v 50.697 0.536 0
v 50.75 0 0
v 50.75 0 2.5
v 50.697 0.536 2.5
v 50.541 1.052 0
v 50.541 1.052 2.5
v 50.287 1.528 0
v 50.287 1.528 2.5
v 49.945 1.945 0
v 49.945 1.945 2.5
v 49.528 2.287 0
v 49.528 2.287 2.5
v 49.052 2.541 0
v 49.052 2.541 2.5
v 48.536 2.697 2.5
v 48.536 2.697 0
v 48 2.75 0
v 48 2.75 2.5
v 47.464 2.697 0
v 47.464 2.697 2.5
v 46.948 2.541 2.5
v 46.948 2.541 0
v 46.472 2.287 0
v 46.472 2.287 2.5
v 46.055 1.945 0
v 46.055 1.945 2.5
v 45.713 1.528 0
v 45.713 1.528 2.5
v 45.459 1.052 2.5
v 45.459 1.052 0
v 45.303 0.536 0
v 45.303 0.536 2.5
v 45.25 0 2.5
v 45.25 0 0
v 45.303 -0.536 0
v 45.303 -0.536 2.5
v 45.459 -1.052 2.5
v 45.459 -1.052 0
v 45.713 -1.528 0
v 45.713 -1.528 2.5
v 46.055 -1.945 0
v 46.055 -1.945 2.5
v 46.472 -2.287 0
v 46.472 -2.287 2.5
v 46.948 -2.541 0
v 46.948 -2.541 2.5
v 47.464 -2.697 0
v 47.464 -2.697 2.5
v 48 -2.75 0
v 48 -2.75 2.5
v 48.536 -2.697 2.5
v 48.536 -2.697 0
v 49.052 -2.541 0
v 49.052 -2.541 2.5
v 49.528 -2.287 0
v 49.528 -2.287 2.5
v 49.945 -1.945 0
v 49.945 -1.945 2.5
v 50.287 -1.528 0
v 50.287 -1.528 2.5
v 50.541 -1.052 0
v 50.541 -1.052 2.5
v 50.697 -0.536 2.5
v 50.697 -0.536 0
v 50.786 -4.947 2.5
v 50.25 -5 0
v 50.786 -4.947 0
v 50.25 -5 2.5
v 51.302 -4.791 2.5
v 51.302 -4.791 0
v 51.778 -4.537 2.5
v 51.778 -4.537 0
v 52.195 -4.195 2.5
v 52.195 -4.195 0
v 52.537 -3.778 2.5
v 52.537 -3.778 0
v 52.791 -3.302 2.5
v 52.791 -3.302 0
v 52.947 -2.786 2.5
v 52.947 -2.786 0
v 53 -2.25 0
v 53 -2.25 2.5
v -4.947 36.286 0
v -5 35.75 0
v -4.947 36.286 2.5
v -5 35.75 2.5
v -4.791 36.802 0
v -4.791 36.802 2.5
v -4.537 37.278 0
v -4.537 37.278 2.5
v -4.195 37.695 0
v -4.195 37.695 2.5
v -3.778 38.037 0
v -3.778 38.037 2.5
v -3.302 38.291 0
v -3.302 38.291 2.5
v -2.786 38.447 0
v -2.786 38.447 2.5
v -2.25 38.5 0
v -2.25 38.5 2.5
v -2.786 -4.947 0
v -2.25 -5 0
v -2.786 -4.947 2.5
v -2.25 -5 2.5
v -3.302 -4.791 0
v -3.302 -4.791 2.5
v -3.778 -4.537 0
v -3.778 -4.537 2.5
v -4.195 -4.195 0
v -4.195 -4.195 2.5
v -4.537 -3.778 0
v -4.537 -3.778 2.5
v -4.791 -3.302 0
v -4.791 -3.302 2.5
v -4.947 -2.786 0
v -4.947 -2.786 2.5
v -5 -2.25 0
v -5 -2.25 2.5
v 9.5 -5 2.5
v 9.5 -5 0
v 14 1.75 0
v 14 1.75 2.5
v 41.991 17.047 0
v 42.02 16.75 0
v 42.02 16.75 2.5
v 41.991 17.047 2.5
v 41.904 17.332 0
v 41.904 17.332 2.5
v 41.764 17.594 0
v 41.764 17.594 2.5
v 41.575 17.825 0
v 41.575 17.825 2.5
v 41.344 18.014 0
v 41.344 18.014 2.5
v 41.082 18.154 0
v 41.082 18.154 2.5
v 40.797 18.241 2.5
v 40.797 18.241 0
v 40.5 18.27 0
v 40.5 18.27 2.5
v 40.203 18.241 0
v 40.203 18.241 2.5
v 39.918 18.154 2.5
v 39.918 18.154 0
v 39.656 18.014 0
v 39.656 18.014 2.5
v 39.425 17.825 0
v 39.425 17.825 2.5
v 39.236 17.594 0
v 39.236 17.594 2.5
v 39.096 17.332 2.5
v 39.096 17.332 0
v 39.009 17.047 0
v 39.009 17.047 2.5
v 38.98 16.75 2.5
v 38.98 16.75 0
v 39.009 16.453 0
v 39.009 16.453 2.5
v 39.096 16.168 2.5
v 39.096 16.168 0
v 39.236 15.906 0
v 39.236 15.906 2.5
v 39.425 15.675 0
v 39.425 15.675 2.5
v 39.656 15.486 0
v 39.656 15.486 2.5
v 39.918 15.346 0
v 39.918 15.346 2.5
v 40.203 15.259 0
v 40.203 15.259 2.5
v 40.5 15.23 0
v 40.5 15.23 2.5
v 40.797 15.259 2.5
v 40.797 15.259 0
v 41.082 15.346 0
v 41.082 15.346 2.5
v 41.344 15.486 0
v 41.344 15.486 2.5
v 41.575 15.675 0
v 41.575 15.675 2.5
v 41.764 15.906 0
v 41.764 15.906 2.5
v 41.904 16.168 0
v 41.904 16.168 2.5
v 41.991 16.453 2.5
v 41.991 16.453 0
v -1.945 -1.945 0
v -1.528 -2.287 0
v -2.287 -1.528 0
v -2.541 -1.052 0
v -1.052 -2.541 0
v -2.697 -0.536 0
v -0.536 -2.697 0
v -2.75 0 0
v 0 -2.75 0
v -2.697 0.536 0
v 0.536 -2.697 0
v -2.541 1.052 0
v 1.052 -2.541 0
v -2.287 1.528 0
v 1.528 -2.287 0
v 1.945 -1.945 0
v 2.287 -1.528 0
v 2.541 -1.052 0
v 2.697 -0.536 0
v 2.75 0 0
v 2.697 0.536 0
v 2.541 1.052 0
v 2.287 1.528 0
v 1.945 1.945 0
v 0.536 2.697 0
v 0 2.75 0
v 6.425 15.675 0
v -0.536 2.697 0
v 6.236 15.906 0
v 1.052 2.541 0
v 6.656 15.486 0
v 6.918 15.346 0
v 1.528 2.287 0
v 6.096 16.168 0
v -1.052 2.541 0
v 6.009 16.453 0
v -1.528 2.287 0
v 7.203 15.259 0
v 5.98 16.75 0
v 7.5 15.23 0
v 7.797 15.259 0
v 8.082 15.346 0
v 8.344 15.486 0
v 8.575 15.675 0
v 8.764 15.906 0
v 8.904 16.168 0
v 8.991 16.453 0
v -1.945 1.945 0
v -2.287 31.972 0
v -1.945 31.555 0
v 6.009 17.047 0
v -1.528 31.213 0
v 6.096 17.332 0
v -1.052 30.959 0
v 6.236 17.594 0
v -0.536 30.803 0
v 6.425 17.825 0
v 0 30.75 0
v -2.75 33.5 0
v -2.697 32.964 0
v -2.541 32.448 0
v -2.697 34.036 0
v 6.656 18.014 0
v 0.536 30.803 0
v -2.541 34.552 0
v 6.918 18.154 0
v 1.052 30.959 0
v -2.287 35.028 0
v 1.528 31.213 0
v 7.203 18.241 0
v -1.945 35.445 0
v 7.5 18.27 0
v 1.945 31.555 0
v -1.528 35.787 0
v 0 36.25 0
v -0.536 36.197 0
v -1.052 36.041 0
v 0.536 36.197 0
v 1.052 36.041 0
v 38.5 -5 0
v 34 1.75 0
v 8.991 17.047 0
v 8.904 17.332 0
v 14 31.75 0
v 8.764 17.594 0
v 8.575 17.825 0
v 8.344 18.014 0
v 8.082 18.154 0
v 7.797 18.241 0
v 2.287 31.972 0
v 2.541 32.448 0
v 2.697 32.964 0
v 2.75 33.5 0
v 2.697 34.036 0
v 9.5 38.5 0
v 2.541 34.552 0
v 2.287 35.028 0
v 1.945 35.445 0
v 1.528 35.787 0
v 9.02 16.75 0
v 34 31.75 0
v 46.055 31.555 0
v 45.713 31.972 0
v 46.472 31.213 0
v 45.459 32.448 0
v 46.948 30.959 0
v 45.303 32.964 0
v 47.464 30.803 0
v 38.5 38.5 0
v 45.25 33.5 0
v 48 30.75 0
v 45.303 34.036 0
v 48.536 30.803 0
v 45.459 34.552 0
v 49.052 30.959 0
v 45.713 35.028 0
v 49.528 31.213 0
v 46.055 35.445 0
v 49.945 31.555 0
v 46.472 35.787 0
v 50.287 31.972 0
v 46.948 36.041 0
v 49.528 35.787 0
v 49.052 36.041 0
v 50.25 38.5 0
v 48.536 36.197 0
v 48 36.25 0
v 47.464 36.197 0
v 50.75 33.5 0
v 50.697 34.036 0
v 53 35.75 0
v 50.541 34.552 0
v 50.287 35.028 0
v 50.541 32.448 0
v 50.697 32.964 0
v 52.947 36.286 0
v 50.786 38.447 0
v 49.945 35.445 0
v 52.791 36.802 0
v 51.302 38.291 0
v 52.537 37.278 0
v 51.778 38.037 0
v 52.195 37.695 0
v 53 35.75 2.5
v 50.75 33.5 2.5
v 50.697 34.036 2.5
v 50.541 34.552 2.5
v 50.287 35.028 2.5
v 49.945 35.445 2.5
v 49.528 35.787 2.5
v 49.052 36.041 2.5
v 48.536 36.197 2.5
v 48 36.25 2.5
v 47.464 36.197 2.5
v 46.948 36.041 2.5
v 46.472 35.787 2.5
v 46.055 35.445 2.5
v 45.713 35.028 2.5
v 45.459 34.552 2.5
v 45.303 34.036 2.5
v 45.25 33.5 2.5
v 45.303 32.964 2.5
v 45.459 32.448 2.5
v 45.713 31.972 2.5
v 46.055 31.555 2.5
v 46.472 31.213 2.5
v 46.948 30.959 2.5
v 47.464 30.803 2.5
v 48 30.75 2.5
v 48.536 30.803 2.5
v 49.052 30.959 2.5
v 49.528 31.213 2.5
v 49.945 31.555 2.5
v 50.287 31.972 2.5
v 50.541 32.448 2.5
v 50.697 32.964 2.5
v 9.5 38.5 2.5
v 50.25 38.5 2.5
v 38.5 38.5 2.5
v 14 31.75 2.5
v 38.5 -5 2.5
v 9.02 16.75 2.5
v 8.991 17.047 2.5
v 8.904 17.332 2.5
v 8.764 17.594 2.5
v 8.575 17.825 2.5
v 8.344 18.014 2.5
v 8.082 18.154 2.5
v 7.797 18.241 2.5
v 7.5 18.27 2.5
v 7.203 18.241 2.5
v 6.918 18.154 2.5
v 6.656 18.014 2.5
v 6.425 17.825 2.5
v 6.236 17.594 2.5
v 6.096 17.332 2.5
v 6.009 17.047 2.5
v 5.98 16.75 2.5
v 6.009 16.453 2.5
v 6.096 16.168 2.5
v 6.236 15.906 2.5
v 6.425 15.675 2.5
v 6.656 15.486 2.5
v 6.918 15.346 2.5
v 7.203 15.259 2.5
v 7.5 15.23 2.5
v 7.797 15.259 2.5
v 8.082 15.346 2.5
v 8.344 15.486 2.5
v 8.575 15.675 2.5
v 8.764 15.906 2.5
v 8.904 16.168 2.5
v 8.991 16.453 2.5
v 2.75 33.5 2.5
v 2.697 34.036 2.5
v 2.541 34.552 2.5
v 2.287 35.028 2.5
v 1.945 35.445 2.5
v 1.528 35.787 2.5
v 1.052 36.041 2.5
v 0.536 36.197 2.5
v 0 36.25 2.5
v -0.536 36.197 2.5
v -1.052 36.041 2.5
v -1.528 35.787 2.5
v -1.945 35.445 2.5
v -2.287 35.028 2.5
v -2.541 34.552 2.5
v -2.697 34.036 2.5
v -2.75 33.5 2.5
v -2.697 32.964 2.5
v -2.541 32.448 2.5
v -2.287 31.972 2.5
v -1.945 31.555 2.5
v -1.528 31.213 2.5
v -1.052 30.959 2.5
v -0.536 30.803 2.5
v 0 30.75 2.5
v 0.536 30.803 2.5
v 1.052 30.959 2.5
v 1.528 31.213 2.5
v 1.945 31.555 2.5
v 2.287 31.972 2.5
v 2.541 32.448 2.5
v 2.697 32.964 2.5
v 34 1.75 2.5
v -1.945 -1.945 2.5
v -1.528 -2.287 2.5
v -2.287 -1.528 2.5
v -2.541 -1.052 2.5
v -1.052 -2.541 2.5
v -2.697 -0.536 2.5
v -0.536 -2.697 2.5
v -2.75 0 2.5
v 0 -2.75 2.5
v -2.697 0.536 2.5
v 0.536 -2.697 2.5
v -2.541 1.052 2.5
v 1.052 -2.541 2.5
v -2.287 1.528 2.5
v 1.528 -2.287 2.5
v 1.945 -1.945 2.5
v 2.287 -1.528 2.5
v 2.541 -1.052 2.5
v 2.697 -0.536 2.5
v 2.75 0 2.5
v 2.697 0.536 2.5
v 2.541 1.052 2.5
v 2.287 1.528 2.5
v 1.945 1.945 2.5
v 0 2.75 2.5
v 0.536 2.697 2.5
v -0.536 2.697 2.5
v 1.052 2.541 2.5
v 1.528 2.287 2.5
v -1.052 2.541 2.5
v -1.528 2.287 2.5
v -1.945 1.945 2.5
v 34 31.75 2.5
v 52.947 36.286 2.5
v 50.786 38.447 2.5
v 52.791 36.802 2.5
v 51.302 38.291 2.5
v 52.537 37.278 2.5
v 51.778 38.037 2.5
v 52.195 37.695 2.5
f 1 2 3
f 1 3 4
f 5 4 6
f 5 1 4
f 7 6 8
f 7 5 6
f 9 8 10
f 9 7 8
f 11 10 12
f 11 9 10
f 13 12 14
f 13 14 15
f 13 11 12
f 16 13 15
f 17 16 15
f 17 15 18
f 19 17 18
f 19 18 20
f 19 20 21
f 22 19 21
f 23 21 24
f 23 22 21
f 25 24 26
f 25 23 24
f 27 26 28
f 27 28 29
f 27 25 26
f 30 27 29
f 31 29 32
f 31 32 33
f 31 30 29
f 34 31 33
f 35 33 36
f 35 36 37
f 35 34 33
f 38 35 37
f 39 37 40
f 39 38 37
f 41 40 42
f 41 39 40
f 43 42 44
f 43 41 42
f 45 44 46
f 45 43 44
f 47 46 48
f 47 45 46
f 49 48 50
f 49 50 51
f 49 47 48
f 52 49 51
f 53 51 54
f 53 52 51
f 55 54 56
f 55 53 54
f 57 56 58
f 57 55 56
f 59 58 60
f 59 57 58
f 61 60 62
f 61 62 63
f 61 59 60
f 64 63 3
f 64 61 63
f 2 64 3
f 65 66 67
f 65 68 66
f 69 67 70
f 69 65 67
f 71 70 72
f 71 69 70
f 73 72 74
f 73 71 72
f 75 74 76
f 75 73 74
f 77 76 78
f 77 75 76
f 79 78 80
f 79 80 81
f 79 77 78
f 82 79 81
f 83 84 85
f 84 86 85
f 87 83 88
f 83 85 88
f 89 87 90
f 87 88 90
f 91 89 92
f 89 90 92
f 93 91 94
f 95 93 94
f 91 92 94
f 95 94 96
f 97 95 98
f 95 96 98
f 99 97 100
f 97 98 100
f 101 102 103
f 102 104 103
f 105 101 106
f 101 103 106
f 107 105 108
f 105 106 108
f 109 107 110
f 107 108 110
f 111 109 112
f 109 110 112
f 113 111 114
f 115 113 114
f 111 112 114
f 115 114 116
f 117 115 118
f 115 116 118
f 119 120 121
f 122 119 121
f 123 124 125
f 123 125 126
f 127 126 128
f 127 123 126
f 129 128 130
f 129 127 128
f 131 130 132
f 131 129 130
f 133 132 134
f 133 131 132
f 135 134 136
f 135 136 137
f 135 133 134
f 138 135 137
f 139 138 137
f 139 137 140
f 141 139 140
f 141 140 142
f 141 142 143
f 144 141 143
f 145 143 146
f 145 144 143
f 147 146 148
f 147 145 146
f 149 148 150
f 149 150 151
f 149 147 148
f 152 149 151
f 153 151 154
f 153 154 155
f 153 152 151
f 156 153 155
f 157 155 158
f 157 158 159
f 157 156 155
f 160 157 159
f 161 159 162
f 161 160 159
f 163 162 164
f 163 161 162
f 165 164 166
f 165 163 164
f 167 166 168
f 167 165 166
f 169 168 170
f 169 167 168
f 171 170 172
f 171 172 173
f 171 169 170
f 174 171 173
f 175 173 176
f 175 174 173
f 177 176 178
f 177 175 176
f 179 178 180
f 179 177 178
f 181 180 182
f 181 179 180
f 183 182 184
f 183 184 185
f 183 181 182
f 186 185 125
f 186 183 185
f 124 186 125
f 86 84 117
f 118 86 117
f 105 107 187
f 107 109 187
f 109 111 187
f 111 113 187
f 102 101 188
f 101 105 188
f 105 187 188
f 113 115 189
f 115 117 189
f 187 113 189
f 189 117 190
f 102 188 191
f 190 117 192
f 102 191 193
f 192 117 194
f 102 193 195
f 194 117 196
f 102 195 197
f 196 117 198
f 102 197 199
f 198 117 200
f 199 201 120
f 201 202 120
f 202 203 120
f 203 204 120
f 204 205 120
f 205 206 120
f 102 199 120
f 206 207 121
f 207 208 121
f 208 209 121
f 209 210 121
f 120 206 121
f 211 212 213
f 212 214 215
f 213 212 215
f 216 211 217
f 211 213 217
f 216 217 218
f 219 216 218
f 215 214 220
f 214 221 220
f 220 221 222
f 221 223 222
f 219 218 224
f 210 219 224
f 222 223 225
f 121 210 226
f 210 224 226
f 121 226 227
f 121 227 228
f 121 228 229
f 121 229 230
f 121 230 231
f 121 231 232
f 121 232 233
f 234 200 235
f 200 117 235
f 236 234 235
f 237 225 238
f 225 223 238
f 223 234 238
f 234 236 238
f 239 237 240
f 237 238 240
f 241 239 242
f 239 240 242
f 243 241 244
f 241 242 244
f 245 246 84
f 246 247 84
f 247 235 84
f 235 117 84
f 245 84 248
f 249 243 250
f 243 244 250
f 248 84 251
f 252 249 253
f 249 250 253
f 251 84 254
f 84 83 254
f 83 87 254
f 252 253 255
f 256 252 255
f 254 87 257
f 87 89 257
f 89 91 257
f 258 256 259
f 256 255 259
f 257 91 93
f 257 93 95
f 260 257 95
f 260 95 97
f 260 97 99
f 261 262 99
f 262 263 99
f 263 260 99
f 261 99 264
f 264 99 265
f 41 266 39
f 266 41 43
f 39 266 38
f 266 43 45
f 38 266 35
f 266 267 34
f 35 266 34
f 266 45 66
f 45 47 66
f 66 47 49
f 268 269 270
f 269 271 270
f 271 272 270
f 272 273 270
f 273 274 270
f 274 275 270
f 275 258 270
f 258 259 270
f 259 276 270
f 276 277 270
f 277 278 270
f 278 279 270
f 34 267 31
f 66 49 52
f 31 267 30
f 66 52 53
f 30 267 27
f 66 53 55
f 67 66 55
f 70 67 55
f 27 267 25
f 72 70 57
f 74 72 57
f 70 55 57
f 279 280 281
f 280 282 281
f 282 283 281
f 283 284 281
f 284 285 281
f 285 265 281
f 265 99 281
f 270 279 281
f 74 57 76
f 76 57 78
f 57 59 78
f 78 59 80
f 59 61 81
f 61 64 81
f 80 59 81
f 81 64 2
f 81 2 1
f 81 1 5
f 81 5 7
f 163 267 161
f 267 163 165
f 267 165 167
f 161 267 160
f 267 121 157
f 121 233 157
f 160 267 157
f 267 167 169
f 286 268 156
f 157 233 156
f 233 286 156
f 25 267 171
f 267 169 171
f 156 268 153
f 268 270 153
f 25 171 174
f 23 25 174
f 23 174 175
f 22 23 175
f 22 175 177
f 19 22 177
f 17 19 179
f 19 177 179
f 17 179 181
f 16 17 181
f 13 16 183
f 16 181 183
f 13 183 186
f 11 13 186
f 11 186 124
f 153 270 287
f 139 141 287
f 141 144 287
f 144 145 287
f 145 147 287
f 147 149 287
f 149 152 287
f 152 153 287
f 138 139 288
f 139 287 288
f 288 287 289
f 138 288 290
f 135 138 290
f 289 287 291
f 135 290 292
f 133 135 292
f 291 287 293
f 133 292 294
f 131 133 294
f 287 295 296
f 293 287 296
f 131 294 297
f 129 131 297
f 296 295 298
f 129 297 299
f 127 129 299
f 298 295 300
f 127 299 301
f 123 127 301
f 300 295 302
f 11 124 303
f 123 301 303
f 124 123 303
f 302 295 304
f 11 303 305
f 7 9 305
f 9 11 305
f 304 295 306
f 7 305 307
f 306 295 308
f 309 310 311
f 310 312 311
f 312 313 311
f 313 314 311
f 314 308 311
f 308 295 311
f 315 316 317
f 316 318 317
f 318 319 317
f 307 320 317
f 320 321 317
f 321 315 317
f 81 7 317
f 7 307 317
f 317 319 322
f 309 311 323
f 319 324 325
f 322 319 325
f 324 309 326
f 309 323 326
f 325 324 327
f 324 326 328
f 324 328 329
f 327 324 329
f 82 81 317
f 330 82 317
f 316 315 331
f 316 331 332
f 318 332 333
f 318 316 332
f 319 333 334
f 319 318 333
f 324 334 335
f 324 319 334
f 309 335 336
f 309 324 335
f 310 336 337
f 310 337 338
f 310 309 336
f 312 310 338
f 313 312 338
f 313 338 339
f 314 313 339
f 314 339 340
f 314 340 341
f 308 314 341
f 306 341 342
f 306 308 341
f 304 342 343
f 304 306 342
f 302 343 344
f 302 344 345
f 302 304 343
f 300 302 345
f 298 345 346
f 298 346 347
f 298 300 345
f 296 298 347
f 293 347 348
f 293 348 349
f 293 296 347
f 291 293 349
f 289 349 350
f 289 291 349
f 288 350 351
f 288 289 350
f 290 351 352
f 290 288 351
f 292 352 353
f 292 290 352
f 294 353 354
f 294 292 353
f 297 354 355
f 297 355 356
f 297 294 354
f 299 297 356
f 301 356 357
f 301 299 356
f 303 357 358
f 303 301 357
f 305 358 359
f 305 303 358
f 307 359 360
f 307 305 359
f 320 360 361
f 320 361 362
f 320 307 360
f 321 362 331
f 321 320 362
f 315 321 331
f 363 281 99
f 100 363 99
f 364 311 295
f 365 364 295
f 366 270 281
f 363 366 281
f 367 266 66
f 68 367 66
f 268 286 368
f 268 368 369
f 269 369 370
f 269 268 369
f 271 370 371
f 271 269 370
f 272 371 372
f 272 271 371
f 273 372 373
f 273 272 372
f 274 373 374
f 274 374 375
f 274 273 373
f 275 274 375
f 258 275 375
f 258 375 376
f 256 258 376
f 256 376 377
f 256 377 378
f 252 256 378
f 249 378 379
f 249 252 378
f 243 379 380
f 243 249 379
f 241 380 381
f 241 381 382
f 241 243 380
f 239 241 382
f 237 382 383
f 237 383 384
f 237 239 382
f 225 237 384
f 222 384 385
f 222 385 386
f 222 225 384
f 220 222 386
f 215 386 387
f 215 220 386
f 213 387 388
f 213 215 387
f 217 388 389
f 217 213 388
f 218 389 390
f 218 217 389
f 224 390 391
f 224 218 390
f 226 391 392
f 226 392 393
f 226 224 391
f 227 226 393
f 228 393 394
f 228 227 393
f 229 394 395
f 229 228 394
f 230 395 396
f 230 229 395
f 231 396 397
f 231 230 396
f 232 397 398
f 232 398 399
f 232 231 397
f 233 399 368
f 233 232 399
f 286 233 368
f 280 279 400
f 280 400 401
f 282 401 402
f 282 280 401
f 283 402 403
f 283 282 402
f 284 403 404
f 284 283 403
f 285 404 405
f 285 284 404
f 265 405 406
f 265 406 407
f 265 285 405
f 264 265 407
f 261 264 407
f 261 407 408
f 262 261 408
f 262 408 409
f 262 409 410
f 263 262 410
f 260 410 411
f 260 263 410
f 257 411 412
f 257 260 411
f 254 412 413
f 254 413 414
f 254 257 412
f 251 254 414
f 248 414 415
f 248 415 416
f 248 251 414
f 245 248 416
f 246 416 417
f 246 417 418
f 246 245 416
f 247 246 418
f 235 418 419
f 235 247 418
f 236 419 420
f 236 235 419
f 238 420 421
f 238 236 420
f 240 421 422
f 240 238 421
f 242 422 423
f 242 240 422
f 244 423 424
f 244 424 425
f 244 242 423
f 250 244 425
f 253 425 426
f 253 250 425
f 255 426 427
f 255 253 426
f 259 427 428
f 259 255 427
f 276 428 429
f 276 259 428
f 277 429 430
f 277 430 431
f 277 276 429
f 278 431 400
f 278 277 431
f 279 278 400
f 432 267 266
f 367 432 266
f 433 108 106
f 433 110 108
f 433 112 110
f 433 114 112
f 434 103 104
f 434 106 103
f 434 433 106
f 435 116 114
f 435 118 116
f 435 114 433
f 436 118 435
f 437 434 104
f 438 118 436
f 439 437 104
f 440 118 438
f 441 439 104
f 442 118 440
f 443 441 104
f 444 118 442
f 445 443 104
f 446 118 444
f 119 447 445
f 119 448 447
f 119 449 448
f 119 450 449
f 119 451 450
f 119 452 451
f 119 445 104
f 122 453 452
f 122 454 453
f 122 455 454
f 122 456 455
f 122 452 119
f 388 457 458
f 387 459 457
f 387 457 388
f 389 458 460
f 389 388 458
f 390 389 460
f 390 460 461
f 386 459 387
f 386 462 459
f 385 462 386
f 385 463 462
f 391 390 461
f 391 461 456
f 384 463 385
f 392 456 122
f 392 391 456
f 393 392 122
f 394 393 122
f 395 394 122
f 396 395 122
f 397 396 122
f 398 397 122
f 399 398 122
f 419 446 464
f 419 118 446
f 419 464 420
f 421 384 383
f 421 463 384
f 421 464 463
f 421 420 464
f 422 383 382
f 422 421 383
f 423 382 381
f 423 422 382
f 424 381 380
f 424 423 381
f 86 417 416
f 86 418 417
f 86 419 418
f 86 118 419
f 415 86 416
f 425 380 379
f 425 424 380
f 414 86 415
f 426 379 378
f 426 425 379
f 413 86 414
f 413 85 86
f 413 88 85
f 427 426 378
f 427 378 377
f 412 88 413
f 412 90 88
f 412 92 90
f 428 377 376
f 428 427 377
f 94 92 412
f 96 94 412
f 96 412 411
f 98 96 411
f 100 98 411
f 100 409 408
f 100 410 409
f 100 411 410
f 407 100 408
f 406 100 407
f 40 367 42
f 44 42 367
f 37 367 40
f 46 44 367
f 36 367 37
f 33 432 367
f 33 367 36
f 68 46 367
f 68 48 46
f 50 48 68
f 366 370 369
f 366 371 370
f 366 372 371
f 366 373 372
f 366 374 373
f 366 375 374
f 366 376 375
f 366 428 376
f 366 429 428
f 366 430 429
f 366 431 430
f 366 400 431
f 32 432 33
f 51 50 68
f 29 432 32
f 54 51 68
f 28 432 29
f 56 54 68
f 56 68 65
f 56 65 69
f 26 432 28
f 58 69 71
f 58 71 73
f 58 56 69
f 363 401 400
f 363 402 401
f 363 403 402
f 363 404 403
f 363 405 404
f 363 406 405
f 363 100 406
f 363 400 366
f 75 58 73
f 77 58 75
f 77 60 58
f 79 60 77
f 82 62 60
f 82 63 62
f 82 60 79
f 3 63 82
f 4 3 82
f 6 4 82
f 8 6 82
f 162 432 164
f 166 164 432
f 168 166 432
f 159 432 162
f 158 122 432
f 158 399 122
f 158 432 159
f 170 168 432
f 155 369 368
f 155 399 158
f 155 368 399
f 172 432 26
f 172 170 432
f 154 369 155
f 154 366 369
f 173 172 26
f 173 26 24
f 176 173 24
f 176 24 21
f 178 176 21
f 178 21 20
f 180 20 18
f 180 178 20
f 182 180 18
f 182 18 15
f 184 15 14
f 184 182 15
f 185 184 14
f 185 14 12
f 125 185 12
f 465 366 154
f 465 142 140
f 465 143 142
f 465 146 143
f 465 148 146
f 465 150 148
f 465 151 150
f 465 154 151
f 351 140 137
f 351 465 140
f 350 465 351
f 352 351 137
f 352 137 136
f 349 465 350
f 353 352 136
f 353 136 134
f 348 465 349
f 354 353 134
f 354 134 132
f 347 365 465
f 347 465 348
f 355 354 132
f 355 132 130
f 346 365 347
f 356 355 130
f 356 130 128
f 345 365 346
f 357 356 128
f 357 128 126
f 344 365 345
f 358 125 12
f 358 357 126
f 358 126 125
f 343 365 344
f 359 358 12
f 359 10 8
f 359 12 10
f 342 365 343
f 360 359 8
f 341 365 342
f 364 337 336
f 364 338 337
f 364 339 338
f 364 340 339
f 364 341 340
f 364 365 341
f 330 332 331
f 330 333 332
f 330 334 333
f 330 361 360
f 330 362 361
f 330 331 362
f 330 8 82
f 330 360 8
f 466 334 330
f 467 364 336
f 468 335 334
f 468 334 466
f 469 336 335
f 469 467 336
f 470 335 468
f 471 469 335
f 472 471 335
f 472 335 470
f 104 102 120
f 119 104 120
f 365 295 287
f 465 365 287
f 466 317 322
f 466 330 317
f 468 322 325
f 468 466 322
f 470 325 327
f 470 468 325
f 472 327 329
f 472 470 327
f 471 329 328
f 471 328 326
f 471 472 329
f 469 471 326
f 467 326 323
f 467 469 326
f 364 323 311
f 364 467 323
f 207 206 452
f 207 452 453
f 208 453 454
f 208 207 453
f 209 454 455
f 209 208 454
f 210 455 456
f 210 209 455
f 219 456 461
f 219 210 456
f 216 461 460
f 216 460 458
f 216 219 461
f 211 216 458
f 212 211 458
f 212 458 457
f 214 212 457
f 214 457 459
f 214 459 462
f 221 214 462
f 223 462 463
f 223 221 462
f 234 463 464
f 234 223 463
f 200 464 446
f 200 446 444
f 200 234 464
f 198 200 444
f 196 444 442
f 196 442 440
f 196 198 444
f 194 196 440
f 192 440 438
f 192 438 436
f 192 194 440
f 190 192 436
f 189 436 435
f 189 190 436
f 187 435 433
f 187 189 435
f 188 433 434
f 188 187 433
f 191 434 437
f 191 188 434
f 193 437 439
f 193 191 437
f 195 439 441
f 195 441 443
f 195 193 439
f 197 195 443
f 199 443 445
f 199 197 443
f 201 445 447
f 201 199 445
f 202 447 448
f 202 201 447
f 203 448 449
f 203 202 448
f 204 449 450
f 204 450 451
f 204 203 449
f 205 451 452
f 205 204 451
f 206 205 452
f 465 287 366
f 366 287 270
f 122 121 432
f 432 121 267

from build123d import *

# Parameters (mm, degrees)
SKETCH1_R           = 2.75
SKETCH1_R_2         = 1.52
BOSS_EXTRUDE1_DEPTH = 2.5
FILLET1_R           = 2.75


with BuildPart() as part:
    # Sketch1 → Boss-Extrude1 (new body)
    with BuildSketch(Plane.XY):
        Polygon((14, 1.75), (34, 1.75), (38.5, -5), (53, -5), (53, 38.5), (38.5, 38.5), (34, 31.75), (14, 31.75), (9.5, 38.5), (-5, 38.5), (-5, -5), (9.5, -5), align=None)
        with Locations((0, 33.5)):
            Circle(SKETCH1_R, mode=Mode.SUBTRACT)
        Circle(SKETCH1_R, mode=Mode.SUBTRACT)
        with Locations((48, 0)):
            Circle(SKETCH1_R, mode=Mode.SUBTRACT)
        with Locations((40.5, 16.75)):
            Circle(SKETCH1_R_2, mode=Mode.SUBTRACT)
        with Locations((7.5, 16.75)):
            Circle(SKETCH1_R_2, mode=Mode.SUBTRACT)
        with Locations((48, 33.5)):
            Circle(SKETCH1_R, mode=Mode.SUBTRACT)
    extrude(amount=BOSS_EXTRUDE1_DEPTH)

    # Fillet1
    fillet1_edges = [part.edges().sort_by_distance(p)[0] for p in [
        (53, -5, 1.25),
        (-5, -5, 1.25),
        (-5, 38.5, 1.25),
        (53, 38.5, 1.25),
    ]]
    fillet(fillet1_edges, radius=FILLET1_R)


solid = part.part
